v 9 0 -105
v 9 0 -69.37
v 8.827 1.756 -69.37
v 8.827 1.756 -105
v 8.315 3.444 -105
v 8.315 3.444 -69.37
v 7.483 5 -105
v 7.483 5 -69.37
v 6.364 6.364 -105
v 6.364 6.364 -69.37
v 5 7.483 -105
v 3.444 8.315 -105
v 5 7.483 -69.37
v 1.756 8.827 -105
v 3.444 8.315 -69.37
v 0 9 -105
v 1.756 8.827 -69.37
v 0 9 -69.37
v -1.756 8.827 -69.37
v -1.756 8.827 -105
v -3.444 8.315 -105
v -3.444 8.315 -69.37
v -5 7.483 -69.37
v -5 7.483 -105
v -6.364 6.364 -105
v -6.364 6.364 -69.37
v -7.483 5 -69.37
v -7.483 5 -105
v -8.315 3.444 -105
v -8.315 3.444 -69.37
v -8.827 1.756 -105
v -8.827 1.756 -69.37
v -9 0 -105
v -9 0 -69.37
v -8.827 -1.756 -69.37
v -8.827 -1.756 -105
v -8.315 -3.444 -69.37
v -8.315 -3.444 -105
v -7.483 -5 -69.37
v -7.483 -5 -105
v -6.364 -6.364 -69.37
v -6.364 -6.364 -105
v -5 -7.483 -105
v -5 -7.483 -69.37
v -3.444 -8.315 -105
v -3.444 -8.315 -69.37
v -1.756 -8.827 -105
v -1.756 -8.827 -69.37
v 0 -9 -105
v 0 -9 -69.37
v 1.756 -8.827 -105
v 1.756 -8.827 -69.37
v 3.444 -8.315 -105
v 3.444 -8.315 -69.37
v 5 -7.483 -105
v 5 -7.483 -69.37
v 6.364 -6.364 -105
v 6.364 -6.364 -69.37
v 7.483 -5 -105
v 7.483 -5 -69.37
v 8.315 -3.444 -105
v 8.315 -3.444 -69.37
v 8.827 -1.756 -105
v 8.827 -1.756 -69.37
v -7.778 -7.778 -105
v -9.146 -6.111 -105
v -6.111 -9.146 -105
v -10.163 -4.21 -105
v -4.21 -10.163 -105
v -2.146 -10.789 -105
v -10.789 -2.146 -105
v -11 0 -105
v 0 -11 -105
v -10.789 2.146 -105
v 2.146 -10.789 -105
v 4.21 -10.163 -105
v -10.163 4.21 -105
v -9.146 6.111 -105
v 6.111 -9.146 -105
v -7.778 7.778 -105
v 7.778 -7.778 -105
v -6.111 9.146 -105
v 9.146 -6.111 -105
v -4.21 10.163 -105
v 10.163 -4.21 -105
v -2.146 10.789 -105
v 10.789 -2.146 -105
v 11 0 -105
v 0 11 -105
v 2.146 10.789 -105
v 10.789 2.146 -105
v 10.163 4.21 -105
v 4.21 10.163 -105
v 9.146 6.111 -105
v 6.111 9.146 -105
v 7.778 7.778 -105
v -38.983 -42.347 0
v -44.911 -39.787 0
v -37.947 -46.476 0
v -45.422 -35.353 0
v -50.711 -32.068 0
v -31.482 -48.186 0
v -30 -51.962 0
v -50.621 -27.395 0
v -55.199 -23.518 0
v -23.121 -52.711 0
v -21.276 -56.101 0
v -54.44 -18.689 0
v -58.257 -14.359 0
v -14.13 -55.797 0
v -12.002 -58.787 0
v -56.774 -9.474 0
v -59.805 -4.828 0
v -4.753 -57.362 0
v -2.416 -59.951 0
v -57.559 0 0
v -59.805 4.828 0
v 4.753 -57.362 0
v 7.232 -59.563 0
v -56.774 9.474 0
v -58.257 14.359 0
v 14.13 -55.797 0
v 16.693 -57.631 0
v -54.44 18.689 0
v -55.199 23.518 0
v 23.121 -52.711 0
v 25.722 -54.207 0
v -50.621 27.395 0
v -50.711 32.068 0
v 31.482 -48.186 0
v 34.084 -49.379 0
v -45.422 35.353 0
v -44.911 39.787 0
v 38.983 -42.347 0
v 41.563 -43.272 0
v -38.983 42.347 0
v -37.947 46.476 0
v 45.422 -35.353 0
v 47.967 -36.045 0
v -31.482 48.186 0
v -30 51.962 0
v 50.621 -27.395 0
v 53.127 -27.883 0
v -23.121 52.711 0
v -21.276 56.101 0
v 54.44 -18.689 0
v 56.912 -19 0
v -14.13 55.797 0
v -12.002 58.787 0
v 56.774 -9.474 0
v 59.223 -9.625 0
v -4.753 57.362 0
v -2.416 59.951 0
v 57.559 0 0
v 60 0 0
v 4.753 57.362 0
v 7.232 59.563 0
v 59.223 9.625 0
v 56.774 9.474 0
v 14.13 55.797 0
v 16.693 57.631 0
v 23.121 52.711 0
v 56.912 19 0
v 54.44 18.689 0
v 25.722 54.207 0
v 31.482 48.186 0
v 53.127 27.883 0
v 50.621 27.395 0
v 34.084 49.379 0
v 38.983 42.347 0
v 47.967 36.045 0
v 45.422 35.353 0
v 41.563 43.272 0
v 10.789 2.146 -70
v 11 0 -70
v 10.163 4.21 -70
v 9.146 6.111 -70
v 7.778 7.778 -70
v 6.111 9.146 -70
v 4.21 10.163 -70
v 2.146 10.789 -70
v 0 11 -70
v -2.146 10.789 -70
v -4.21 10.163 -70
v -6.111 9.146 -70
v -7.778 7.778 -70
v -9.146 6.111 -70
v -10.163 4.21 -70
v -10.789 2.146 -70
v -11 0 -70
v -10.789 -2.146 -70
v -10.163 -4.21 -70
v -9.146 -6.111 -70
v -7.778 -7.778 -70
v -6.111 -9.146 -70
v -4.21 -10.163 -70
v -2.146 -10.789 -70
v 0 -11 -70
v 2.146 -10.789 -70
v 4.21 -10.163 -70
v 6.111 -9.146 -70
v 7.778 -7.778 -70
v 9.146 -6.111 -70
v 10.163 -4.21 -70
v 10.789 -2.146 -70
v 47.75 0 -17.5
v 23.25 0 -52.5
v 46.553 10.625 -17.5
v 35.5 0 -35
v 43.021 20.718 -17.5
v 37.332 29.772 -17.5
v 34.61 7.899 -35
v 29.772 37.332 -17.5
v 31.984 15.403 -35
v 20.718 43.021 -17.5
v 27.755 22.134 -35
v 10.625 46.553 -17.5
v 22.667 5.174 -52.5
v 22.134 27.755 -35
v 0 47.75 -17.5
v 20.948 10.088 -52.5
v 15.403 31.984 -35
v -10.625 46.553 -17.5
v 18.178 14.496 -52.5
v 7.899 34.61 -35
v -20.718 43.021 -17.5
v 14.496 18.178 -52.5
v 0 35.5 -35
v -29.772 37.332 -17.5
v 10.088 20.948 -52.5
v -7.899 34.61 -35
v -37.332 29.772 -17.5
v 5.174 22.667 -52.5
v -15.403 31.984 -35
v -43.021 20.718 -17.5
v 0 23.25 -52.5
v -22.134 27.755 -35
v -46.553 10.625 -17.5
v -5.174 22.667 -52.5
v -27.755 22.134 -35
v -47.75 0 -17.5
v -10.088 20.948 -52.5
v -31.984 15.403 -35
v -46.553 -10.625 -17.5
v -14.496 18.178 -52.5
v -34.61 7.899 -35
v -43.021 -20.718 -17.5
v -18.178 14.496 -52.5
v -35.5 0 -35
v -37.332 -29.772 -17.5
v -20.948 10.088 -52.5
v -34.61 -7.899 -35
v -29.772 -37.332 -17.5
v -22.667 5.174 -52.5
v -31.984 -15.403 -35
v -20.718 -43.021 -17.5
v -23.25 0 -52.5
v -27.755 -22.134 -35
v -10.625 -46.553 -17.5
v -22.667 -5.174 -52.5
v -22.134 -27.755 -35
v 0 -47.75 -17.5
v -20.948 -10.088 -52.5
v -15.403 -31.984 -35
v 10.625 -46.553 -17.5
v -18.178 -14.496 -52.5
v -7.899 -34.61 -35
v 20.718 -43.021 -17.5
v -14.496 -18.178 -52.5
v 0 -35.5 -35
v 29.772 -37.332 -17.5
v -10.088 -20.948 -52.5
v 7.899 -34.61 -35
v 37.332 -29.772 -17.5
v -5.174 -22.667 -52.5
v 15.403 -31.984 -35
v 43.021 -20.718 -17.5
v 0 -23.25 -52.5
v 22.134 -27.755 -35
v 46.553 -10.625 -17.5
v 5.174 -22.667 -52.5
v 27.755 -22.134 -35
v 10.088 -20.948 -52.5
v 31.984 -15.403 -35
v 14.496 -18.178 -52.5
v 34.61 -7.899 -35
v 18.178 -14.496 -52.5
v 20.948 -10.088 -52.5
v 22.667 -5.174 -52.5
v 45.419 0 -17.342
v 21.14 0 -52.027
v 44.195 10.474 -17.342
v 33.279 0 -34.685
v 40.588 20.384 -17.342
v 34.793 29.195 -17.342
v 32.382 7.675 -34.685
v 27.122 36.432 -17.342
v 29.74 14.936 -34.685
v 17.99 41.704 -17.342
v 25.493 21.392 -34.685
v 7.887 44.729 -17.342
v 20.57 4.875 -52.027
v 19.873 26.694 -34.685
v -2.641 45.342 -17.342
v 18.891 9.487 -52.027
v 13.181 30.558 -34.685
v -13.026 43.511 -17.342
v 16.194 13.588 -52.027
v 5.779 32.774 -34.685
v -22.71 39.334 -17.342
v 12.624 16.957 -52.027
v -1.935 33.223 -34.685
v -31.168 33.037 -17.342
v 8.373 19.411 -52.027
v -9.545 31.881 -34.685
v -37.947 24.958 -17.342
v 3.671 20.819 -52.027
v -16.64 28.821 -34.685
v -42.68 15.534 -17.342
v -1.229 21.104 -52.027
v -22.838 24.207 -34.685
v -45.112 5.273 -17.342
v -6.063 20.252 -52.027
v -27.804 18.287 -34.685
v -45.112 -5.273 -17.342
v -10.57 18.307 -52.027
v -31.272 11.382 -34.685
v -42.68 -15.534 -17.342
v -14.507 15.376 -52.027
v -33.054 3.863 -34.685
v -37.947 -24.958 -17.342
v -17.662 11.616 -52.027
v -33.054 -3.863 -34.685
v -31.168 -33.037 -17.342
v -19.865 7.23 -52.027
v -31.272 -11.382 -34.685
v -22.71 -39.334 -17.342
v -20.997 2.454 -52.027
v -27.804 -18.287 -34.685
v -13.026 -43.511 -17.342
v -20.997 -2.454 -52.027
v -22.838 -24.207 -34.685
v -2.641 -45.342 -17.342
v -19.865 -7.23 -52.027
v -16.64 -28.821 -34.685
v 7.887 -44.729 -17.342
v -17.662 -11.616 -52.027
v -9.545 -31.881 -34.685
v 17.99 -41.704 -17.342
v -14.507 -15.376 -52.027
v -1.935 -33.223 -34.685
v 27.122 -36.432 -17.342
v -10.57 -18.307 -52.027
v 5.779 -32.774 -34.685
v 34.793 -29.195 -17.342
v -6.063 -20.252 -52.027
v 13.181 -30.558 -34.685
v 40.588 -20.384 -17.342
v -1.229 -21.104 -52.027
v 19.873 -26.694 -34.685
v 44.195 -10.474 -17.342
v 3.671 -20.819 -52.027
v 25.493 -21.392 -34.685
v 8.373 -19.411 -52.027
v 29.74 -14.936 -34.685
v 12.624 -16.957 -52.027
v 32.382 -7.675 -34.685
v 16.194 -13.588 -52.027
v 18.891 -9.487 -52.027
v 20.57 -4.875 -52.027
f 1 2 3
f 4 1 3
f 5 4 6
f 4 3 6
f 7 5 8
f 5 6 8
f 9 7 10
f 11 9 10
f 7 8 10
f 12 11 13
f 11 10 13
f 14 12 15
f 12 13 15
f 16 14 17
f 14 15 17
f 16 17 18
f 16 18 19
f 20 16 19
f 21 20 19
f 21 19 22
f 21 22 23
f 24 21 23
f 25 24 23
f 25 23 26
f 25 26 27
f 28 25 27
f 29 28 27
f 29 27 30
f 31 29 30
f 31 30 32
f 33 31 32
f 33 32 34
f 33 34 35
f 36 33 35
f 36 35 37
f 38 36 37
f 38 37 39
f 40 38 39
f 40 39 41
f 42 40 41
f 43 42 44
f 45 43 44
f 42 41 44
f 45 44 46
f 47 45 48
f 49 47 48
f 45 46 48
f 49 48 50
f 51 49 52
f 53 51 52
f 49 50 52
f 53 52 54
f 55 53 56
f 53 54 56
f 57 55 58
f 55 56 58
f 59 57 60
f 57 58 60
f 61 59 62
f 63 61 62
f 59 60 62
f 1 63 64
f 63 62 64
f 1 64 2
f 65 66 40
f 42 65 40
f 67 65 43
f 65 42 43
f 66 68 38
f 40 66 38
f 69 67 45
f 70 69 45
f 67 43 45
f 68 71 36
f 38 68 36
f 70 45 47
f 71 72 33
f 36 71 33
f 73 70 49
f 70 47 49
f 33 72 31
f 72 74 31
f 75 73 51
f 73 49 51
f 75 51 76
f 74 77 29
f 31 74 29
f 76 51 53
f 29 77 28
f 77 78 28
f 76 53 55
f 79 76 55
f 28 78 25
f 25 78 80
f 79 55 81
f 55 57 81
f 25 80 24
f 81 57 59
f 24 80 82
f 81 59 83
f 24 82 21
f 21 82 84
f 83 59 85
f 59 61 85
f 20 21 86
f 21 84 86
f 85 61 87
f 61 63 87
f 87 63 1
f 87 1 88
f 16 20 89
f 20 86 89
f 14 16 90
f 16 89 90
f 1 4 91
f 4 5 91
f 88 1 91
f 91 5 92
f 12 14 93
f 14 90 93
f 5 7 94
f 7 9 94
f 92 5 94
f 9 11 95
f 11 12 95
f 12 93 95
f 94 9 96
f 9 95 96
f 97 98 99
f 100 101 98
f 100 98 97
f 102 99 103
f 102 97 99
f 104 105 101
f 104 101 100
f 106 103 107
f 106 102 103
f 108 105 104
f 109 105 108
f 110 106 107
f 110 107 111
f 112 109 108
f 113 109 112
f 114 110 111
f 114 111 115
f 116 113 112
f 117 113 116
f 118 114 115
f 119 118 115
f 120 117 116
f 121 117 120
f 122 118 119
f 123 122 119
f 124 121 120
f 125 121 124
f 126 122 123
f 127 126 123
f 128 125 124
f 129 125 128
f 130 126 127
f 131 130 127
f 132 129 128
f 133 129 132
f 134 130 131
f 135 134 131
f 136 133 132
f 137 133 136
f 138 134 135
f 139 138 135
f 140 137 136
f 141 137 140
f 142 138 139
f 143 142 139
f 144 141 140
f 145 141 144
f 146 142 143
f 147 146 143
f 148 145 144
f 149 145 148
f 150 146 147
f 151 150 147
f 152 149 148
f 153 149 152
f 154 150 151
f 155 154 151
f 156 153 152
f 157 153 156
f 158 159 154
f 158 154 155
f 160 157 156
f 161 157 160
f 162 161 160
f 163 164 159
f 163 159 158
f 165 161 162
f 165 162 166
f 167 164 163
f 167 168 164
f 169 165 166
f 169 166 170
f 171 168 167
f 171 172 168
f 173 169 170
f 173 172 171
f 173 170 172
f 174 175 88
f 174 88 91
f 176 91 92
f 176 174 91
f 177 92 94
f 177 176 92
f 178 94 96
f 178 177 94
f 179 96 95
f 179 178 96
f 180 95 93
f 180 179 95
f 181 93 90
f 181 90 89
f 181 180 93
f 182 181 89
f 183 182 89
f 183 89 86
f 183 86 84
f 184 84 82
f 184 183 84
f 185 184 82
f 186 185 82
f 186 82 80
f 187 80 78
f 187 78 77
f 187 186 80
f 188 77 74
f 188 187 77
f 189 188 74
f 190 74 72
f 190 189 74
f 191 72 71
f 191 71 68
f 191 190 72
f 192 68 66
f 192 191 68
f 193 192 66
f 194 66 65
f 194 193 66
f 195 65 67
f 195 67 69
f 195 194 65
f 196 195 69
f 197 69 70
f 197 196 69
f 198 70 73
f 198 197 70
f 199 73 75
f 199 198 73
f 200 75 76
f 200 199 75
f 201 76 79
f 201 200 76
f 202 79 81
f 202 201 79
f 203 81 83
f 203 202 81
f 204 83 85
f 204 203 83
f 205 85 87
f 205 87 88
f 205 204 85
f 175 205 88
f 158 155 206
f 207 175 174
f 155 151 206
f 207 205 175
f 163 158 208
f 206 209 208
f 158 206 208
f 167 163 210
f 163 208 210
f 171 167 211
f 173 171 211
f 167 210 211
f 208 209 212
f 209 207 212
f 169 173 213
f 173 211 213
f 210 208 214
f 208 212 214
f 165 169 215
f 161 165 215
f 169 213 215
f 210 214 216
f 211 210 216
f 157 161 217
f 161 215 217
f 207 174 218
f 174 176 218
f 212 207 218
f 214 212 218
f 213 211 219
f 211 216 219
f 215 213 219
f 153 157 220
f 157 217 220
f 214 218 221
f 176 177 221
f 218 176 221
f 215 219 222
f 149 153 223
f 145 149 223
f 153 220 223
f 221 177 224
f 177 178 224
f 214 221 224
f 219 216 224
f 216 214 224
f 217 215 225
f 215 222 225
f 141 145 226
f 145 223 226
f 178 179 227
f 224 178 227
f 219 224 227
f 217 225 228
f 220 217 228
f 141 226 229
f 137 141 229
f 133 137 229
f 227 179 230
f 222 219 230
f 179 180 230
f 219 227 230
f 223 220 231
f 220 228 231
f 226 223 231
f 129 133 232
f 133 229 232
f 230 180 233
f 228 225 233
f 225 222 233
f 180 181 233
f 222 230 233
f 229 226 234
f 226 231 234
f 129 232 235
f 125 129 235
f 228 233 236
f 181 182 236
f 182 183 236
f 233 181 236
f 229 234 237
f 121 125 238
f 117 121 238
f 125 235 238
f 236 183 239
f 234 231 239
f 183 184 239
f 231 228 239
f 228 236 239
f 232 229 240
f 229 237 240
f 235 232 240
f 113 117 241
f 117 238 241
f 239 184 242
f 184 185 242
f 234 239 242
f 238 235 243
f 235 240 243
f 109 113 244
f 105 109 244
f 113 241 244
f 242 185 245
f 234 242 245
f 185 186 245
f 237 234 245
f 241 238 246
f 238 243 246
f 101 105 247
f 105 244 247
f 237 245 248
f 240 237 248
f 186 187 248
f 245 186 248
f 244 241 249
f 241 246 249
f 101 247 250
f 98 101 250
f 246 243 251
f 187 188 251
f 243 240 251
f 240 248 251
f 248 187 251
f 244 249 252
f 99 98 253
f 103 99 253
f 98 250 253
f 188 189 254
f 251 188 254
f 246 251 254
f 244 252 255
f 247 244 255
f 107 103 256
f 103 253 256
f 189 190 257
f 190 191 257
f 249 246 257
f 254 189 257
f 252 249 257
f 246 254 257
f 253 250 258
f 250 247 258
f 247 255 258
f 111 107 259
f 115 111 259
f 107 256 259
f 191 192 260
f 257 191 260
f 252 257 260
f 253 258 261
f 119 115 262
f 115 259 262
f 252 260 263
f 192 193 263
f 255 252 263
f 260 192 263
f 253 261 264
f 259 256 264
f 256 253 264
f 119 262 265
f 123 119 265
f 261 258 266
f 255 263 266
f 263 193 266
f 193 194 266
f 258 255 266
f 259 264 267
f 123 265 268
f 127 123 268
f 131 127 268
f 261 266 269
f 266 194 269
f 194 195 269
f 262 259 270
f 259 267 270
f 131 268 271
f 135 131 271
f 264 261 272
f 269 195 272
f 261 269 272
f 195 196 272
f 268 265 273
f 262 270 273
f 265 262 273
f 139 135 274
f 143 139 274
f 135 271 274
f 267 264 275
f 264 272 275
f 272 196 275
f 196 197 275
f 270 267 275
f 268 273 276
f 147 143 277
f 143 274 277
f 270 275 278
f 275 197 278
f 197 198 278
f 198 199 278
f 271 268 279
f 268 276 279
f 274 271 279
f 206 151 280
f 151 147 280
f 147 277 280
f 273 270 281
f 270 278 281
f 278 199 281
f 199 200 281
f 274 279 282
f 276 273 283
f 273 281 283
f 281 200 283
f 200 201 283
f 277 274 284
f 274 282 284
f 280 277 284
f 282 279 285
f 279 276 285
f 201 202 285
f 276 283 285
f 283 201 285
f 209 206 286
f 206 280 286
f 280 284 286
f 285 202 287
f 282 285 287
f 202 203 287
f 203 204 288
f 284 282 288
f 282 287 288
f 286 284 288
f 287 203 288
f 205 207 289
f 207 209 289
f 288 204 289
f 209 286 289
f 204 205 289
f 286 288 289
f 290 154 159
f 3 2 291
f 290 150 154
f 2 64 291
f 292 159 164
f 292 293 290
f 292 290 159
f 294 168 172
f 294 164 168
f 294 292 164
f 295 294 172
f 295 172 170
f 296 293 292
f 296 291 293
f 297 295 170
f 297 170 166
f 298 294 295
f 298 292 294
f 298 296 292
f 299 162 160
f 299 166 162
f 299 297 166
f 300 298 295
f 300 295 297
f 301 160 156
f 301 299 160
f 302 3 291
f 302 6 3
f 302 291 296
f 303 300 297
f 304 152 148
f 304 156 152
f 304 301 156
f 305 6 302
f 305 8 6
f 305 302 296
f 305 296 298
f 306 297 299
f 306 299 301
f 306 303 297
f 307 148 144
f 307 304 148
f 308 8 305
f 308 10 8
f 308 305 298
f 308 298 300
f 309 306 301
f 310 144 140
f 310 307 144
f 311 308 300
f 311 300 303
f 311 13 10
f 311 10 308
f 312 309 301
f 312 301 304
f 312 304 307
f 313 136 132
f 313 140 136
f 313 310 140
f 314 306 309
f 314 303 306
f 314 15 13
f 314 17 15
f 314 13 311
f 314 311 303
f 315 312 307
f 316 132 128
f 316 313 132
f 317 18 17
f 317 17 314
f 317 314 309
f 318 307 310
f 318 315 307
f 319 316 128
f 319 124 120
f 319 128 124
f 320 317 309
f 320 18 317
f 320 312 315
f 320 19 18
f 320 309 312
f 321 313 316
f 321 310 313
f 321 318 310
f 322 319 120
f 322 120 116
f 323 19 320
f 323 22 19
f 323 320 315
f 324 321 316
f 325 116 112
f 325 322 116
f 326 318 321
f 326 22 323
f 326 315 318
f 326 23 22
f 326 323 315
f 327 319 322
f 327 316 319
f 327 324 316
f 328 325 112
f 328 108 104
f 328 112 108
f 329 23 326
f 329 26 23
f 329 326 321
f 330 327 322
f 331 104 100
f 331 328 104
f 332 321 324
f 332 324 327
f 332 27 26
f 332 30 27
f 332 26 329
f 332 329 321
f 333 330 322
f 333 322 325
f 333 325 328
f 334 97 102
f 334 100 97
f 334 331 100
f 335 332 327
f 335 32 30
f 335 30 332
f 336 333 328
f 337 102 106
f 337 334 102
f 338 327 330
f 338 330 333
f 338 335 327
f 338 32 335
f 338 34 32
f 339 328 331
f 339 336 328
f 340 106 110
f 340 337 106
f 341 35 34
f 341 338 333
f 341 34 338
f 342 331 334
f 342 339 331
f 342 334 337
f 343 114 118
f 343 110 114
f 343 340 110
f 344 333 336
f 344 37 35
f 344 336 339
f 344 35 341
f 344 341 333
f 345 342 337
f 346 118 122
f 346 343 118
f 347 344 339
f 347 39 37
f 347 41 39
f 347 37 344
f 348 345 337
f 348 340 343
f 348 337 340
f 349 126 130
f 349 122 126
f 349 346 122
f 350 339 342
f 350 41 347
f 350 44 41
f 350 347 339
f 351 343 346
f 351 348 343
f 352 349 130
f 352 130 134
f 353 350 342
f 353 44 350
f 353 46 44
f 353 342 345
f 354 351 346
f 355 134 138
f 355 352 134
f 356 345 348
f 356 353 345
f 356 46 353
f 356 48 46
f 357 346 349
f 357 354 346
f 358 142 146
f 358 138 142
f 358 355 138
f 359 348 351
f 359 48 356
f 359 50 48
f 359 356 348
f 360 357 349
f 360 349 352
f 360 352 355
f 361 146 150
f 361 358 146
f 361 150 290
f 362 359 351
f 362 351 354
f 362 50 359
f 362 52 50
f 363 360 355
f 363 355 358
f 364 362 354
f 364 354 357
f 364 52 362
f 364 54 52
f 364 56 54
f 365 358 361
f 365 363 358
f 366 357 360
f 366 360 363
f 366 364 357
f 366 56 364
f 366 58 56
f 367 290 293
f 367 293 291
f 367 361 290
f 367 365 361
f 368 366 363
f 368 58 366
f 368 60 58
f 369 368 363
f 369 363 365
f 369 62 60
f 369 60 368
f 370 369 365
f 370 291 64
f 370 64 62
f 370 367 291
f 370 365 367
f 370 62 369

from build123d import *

# Parameters (mm, degrees)
F0_R     = 60
F2_R     = 11
F4_DEPTH = 35
F5_T     = -2


with BuildPart() as f3:
    # F0 (on Top) → F3 section 0
    with BuildSketch(Plane.XY):
        Circle(F0_R)
    # F2 (on offset) → F3 section 1
    with BuildSketch(Plane.XY.offset(-70)):
        Circle(F2_R)
    loft()

    # F4 (add): a face of the model
    f4_faces = [f3.faces().sort_by_distance(p)[0] for p in [
        (0, 0, -70),
    ]]
    extrude(f4_faces, amount=F4_DEPTH)

    # F5
    f5_openings = [f3.faces().sort_by_distance(p)[0] for p in [
        (0, 0, 0),
        (0, 0, -105),
    ]]
    offset(amount=F5_T, openings=f5_openings, kind=Kind.INTERSECTION)


solid = f3.part
